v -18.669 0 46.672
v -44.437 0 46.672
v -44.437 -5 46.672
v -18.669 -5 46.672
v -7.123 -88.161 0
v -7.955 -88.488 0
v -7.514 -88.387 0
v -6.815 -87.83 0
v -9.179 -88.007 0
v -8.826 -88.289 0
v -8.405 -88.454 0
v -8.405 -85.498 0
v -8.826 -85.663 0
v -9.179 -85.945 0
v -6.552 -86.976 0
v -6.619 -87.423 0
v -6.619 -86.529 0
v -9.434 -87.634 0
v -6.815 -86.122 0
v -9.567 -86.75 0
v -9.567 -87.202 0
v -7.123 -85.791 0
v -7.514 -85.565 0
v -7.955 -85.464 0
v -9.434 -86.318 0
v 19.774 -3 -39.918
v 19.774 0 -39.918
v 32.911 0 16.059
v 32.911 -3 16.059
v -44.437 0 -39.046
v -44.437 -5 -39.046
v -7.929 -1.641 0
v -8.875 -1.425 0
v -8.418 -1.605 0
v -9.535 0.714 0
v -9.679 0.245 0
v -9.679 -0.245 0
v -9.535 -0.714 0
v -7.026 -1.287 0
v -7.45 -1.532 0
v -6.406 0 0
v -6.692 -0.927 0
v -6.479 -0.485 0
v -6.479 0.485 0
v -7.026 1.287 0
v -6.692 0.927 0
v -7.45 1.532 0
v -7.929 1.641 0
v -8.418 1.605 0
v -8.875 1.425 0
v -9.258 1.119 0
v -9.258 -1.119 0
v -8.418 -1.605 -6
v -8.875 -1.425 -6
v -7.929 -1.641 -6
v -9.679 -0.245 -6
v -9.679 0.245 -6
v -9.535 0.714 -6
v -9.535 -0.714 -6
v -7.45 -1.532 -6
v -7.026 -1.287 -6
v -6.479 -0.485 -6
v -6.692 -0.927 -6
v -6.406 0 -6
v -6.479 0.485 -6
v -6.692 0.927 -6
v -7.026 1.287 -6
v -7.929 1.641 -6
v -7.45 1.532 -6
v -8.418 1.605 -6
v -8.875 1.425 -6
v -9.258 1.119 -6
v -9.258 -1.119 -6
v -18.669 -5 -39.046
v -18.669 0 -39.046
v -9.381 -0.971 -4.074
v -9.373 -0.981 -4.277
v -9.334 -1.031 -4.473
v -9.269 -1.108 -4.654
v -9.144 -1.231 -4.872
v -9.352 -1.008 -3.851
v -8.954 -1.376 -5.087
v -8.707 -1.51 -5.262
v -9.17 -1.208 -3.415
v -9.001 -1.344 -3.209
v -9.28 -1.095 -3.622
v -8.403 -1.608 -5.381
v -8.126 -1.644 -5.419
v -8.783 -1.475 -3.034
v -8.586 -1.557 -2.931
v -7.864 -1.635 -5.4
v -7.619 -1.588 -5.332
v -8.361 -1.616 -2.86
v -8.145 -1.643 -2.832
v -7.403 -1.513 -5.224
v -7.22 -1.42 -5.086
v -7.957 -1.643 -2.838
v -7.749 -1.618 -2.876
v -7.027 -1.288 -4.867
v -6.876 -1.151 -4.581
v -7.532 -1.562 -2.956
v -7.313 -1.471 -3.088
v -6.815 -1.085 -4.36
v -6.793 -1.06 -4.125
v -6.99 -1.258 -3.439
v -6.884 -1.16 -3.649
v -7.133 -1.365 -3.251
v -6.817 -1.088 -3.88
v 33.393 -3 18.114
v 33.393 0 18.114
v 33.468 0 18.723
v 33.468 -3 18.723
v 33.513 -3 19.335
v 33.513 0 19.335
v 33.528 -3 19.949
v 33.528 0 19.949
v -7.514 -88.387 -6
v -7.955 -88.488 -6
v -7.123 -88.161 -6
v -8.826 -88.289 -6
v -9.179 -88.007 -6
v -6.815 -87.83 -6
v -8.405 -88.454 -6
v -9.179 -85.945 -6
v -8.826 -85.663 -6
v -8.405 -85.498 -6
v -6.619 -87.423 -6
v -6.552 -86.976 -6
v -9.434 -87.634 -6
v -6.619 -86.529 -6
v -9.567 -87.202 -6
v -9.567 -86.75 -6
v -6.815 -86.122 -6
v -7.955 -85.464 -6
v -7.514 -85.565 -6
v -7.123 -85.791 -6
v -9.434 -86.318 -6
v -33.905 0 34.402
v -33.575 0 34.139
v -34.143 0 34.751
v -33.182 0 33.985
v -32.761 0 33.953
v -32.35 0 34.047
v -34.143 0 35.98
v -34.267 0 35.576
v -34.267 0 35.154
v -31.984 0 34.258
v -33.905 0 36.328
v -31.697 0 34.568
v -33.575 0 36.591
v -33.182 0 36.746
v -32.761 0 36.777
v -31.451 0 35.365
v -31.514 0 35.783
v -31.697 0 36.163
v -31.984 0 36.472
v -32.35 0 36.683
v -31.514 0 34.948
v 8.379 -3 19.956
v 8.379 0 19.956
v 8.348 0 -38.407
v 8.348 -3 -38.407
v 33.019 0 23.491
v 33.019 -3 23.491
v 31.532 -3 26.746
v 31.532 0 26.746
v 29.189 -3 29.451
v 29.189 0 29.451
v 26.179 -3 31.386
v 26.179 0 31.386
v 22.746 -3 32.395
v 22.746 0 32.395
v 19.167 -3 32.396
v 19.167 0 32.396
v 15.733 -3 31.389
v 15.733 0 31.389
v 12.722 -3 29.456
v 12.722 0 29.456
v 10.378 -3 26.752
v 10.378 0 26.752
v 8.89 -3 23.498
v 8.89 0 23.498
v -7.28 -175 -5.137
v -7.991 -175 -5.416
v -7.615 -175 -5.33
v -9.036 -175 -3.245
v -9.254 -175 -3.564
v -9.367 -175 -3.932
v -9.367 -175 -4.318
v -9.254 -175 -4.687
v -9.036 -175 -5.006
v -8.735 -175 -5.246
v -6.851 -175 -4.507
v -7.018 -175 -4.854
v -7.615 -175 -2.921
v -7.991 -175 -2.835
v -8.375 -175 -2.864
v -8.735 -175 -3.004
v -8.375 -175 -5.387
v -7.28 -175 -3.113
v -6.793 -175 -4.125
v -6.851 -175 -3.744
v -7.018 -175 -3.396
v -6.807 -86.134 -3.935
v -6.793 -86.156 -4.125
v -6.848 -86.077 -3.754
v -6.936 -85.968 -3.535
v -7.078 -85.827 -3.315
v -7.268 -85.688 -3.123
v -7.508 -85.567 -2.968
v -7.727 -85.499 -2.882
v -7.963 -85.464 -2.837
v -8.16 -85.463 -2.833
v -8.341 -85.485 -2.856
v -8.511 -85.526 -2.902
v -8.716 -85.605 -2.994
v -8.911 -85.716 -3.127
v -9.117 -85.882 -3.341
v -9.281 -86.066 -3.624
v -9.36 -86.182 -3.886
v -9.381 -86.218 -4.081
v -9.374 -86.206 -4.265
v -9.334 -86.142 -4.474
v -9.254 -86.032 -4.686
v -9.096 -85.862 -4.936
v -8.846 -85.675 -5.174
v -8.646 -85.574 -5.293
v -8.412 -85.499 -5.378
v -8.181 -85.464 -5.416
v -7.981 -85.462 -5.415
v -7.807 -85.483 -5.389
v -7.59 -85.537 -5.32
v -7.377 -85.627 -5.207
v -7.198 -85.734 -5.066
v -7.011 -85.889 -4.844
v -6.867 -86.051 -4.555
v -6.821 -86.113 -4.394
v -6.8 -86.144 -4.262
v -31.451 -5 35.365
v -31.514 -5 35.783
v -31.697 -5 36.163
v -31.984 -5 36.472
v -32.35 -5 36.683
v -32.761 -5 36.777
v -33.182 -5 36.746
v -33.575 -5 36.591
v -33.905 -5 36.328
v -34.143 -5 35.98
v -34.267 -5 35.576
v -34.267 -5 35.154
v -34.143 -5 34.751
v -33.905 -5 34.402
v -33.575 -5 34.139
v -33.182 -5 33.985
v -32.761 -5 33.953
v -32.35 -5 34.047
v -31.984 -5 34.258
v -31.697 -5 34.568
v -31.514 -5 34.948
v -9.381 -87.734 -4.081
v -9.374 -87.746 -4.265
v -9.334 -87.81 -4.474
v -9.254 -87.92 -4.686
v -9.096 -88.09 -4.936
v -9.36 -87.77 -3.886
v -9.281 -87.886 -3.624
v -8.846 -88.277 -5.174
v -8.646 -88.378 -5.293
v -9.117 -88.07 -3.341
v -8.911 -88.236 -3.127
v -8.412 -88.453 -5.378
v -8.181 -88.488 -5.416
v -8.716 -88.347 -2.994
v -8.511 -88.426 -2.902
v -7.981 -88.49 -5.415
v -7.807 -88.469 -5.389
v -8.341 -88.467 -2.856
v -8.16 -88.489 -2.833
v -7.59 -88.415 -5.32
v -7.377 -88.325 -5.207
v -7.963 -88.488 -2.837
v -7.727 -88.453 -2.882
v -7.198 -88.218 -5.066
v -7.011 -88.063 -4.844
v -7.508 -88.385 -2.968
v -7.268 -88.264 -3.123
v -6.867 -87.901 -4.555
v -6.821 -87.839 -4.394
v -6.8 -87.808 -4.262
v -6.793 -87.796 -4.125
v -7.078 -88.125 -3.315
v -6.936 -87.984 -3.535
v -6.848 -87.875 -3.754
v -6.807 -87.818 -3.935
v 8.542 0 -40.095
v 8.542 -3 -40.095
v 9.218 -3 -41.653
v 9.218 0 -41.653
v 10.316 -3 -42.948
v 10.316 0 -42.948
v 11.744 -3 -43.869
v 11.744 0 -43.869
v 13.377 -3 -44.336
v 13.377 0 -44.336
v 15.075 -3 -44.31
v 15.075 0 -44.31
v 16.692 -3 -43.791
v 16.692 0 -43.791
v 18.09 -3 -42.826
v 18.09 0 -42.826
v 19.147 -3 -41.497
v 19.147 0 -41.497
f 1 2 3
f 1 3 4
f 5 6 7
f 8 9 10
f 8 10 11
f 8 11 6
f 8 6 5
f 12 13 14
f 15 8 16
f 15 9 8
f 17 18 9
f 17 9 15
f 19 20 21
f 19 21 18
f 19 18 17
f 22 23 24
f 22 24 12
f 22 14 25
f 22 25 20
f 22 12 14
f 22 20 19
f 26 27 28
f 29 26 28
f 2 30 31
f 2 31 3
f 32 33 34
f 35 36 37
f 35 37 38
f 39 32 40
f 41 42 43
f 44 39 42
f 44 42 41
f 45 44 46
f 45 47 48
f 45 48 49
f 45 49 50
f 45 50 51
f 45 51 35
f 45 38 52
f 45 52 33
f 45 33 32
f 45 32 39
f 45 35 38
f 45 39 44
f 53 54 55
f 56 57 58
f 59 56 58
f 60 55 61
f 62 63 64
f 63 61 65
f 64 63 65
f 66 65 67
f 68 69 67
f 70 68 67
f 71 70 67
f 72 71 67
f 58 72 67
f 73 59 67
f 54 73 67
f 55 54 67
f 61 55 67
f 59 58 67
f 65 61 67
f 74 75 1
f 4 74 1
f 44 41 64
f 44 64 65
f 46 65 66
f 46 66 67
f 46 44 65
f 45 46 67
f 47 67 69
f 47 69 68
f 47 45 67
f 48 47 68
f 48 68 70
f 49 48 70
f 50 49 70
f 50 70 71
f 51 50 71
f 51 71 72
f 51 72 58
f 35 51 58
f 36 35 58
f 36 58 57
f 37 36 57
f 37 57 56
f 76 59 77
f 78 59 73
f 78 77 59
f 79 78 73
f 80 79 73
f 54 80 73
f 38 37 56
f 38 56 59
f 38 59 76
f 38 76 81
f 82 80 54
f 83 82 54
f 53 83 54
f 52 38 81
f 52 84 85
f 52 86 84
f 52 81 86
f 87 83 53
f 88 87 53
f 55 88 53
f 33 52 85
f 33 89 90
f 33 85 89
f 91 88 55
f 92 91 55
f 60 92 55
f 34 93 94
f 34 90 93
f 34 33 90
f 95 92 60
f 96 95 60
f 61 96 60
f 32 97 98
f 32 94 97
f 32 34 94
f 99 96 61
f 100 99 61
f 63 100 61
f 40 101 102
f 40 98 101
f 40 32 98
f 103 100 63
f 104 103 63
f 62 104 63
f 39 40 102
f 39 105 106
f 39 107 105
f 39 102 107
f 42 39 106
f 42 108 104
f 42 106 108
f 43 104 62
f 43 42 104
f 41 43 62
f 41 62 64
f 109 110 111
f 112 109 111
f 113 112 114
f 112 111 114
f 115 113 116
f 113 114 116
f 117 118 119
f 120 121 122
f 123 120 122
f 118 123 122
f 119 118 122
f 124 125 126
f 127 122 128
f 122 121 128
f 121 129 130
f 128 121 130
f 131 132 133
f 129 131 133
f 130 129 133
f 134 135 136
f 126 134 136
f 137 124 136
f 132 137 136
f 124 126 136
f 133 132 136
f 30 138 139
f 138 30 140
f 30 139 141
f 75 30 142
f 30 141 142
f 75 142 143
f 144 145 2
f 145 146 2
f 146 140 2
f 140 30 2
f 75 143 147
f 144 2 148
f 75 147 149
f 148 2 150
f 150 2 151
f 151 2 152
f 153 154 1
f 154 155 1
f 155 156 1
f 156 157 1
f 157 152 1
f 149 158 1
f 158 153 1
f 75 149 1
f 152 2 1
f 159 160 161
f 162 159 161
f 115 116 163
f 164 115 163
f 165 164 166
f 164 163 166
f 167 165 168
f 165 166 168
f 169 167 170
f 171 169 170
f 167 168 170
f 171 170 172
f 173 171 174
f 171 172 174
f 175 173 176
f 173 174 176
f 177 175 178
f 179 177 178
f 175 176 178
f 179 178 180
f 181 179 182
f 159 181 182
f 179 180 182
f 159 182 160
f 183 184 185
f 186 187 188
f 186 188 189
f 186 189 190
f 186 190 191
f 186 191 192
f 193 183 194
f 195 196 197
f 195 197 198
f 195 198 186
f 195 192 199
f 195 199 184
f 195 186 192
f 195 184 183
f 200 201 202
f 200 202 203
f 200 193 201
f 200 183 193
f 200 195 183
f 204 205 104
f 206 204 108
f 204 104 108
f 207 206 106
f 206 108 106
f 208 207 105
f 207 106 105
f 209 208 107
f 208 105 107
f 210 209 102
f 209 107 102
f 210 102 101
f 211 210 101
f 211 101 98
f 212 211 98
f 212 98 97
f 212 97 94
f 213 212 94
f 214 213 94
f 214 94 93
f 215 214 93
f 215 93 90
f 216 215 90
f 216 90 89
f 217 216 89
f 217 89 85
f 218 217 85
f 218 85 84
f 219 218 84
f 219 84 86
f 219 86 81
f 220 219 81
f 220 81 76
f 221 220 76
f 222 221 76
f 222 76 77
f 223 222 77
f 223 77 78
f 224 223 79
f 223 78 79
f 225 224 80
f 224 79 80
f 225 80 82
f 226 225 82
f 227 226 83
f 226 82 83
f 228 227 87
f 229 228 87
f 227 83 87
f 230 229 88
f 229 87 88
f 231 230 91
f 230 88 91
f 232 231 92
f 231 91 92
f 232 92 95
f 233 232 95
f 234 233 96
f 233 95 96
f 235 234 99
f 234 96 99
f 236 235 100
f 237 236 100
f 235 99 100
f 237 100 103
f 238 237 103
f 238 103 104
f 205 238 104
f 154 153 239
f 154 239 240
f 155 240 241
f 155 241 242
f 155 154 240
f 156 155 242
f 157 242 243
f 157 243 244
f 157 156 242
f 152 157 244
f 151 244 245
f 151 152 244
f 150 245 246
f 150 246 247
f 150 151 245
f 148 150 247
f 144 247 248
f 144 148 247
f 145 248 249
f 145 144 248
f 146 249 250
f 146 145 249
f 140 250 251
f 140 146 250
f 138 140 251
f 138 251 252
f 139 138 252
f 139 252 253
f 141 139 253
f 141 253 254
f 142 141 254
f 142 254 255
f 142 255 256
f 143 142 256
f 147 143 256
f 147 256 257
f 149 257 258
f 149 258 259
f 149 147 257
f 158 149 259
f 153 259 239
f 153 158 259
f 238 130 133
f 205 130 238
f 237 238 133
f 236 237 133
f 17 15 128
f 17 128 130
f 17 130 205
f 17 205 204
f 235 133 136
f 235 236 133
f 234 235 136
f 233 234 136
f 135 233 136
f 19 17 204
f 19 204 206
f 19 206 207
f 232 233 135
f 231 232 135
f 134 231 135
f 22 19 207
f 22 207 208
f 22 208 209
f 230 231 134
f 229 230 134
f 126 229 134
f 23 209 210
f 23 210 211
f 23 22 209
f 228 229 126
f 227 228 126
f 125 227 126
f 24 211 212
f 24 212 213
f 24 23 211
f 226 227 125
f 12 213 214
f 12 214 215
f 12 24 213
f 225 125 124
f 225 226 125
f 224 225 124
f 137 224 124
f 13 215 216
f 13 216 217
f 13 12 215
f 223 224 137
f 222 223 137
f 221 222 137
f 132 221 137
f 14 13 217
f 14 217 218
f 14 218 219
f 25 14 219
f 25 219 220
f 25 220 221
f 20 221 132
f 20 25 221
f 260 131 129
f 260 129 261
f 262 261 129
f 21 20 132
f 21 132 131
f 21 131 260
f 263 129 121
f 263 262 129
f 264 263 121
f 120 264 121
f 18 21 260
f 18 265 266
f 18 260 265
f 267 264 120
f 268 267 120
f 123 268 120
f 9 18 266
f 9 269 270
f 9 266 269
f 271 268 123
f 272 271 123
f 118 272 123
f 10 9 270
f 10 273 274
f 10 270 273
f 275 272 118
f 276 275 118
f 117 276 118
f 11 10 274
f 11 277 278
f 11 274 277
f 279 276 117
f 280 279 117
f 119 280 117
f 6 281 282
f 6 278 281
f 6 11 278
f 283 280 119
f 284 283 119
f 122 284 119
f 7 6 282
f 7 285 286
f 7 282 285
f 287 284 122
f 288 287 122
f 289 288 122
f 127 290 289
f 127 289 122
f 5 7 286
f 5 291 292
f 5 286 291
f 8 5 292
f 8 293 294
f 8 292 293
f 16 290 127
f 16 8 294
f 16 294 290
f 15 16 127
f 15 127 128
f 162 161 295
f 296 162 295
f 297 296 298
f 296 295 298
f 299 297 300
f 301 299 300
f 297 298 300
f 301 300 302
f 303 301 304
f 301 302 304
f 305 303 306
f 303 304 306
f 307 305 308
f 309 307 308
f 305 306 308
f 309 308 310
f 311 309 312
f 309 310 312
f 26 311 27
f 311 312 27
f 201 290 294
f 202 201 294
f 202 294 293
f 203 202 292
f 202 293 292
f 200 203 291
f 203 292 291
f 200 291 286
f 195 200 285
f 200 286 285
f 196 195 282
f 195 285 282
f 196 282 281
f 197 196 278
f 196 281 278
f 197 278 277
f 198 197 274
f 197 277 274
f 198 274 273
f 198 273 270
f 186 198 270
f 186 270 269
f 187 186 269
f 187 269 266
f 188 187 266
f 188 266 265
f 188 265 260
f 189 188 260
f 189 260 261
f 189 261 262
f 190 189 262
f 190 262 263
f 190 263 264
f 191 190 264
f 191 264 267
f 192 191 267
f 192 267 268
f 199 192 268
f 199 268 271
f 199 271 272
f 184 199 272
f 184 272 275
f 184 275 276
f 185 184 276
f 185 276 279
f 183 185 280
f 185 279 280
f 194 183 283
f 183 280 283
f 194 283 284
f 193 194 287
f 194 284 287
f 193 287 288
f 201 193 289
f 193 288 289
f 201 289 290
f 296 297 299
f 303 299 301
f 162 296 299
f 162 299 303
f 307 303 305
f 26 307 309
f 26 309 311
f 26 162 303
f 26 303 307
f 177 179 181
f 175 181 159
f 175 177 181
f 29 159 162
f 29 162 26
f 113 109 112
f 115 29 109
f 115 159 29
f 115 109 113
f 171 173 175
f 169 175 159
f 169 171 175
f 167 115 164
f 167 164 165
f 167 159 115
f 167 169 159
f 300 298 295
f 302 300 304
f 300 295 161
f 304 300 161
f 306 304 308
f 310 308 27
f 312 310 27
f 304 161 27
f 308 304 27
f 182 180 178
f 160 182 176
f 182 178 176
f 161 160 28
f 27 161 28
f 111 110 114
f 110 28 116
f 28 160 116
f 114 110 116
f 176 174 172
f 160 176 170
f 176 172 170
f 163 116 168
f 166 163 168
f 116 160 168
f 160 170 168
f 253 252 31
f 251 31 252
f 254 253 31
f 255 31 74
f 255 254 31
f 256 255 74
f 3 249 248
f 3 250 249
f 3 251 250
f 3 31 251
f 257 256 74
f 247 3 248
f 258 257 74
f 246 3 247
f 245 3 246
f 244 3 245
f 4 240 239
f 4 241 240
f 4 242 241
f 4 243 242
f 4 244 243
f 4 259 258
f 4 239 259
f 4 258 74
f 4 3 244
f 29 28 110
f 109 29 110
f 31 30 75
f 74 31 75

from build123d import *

# Parameters (mm, degrees)
F1_DEPTH = 3
F0_R     = 1.294327
F2_DEPTH = 175
F0_W     = 25.767949
F0_H     = 85.717865
F0_R_2   = 1.415963
F3_DEPTH = 5
F4_R     = 1.645773
F4_R_2   = 1.516116
F5_DEPTH = 6


with BuildPart() as f1:
    # F0 (on Front) → F1 (new body)
    with BuildSketch(Plane.XZ):
        with BuildLine():
            ThreePointArc((33.527691, 19.949228), (20.956538, 32.523725), (8.378697, 19.955917))
            ThreePointArc((8.378697, 19.955917), (18.980465, 7.530438), (32.910786, 16.058987))
            Line((32.910786, 16.058987), (33.393006, 18.113727))
            ThreePointArc((33.393006, 18.113727), (33.493975, 19.02901), (33.527691, 19.949228))
        make_face()
        with BuildLine():
            ThreePointArc((8.347651, -38.407498), (14.22957, -32.804785), (19.926856, -38.595147))
            ThreePointArc((19.926856, -38.595147), (19.888433, -39.26114), (19.773675, -39.918296))
            Line((19.773675, -39.918296), (32.910786, 16.058987))
            ThreePointArc((32.910786, 16.058987), (18.980465, 7.530438), (8.378697, 19.955917))
            Line((8.378697, 19.955917), (8.347651, -38.407498))
        make_face()
        with BuildLine():
            ThreePointArc((19.773675, -39.918296), (19.888433, -39.26114), (19.926856, -38.595147))
            ThreePointArc((19.926856, -38.595147), (14.22957, -32.804785), (8.347651, -38.407498))
            ThreePointArc((8.347651, -38.407498), (13.376613, -44.336301), (19.773675, -39.918296))
        make_face()
    extrude(amount=F1_DEPTH)


with BuildPart() as f2:
    # F0 (on Front) → F2 (new body)
    with BuildSketch(Plane.XZ):
        with Locations((-8.087484, -4.125377)):
            Circle(F0_R)
    extrude(amount=F2_DEPTH)

    # F4 (on Top) → F5 (join)
    with BuildSketch(Plane.XY):
        with Locations((-8.051719, 0)):
            Circle(F4_R)
        with Locations((-8.068082, -86.976007)):
            Circle(F4_R_2)
    extrude(amount=-F5_DEPTH)


with BuildPart() as f3:
    # F0 (on Front) → F3 (new body)
    with BuildSketch(Plane.XZ):
        with Locations((-31.552588, 3.812603)):
            Rectangle(F0_W, F0_H)
        with Locations((-32.867279, 35.365194)):
            Circle(F0_R_2, mode=Mode.SUBTRACT)
    extrude(amount=F3_DEPTH)


solid = Compound([f1.part, f2.part, f3.part])
